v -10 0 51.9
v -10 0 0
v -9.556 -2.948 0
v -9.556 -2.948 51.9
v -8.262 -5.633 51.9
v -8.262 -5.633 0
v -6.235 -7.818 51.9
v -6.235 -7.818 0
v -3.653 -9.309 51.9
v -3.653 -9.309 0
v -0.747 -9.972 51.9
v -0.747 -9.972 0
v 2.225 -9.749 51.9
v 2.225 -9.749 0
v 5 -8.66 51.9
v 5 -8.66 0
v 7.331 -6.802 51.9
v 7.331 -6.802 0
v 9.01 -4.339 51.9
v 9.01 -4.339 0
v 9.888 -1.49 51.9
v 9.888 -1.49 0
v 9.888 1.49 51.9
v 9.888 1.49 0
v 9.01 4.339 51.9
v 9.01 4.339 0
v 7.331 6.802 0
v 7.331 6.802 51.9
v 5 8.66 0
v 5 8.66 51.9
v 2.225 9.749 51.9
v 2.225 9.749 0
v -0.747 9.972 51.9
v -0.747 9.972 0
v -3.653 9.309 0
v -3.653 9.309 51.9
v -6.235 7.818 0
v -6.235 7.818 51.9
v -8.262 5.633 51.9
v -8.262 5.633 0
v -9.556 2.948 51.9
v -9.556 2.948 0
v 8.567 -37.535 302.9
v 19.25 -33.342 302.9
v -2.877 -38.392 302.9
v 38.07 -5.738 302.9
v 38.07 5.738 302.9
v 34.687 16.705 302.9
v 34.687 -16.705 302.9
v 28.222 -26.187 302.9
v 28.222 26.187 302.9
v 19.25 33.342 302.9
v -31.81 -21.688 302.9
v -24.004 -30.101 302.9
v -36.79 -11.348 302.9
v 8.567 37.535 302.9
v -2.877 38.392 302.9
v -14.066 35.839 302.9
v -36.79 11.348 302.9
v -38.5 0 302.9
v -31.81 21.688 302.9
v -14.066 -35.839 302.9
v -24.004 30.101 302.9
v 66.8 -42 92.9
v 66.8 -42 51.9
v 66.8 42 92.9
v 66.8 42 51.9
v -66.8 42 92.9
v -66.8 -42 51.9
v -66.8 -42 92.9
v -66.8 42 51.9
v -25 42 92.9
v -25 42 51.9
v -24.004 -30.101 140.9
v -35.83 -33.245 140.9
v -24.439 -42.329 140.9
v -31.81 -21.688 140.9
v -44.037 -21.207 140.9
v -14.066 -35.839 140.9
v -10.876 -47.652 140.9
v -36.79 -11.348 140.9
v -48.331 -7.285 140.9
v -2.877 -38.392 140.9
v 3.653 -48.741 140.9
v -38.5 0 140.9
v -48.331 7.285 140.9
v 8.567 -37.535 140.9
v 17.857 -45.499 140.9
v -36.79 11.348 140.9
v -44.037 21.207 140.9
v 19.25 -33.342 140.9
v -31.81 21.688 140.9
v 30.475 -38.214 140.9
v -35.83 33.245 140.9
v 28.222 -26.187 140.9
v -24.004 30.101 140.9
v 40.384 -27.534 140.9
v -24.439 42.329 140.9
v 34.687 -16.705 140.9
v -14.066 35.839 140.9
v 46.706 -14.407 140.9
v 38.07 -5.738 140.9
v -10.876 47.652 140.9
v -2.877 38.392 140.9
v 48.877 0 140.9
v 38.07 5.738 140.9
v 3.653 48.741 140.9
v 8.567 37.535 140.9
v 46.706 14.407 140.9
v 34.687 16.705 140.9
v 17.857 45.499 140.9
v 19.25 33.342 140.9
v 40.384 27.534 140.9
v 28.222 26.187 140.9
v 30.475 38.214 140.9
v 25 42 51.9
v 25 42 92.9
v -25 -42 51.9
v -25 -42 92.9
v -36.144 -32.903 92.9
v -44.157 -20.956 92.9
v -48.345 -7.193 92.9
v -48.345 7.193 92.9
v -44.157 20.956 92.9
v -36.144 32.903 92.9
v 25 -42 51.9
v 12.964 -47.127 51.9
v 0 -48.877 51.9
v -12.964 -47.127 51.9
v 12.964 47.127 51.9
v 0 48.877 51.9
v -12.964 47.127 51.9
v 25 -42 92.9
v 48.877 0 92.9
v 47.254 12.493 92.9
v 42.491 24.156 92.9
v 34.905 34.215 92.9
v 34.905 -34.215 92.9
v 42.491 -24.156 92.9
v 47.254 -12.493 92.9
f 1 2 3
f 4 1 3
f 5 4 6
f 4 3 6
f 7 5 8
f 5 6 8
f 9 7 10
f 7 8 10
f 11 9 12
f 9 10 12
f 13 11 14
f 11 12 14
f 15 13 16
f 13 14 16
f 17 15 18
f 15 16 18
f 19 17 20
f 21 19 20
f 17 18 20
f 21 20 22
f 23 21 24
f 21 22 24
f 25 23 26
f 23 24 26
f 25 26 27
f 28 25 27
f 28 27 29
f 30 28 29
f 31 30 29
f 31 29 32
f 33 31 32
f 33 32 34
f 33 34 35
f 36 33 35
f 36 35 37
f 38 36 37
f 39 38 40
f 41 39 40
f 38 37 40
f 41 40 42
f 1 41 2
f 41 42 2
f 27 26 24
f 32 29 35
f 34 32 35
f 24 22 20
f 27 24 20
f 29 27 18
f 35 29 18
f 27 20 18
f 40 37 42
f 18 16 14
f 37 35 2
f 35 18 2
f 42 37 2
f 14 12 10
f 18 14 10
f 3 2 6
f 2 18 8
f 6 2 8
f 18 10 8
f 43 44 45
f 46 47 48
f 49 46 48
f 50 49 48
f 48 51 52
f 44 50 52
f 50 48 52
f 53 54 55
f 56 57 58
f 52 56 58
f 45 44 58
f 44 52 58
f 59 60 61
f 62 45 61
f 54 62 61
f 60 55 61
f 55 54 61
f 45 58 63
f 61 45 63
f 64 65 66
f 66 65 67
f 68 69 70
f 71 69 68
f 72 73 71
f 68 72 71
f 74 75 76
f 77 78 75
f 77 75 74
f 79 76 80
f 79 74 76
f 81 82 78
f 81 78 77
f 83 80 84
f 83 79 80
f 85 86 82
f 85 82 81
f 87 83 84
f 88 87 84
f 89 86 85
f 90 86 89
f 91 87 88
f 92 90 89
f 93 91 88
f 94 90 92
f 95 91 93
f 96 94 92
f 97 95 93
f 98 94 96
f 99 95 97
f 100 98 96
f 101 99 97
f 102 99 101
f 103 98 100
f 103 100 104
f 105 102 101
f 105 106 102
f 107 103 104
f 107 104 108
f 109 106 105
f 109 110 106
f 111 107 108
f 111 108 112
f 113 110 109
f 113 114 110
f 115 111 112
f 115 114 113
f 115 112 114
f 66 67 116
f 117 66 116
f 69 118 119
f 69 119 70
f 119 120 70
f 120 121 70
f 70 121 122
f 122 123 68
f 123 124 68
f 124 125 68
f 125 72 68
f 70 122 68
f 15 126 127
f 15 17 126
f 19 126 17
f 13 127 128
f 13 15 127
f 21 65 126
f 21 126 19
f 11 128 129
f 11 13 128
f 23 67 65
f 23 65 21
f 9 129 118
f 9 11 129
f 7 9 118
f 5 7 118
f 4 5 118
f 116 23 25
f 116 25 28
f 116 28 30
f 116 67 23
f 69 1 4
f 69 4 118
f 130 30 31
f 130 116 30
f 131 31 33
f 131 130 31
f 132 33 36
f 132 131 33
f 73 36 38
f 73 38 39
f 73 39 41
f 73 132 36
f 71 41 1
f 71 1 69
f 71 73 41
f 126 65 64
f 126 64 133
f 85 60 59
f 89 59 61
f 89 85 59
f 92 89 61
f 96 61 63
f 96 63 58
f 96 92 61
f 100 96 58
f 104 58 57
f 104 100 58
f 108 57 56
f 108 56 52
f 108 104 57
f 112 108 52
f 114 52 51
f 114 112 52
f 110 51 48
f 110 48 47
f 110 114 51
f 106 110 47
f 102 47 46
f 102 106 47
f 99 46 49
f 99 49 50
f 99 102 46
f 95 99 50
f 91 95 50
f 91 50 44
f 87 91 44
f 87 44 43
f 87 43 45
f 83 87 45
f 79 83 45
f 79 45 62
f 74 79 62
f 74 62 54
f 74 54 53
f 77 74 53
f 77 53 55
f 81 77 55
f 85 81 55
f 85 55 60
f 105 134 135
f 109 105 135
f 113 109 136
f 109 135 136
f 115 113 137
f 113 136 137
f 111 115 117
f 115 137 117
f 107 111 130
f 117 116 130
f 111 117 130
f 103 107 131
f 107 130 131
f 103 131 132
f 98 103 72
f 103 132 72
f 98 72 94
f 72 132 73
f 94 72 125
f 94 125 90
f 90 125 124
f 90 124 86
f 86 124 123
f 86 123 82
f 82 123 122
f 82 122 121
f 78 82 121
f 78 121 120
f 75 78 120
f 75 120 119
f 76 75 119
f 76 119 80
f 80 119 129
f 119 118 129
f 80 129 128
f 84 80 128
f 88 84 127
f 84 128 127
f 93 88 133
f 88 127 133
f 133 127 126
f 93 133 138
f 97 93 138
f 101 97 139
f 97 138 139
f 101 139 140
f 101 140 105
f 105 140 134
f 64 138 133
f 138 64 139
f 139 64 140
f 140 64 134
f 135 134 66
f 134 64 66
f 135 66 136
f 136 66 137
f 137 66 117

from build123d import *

# Parameters (mm, degrees)
SKETCH_1_R      = 10
EXTRUDE_1_DEPTH = 51.9
SKETCH_2_R      = 48.877397639
EXTRUDE_2_DEPTH = 89
SKETCH_4_W      = 133.6
SKETCH_4_H      = 84
EXTRUDE_4_DEPTH = 41
SKETCH_5_R      = 38.5
EXTRUDE_5_DEPTH = 251


with BuildPart() as part:
    # 草图1 → 凸台-拉伸1 (new body)
    with BuildSketch(Plane.XY):
        with Locations(Location((0, 0, 0), (0, 0, 180))):
            Circle(SKETCH_1_R)
    extrude(amount=EXTRUDE_1_DEPTH)

    # 草图2 → 凸台-拉伸2 (add)
    with BuildSketch(Plane.XY.offset(51.9)):
        Circle(SKETCH_2_R)
    extrude(amount=EXTRUDE_2_DEPTH)

    # 草图4 → 凸台-拉伸4 (add)
    with BuildSketch(Plane(origin=(0, 0, 51.9), x_dir=(-1, 0, 0), z_dir=(0, 0, -1))):
        Rectangle(SKETCH_4_W, SKETCH_4_H)
    extrude(amount=-EXTRUDE_4_DEPTH)

    # 草图5 → 凸台-拉伸5 (add)
    with BuildSketch(Plane(origin=(0, 0, 51.9), x_dir=(-1, 0, 0), z_dir=(0, 0, -1))):
        Circle(SKETCH_5_R)
    extrude(amount=-EXTRUDE_5_DEPTH)


solid = part.part
